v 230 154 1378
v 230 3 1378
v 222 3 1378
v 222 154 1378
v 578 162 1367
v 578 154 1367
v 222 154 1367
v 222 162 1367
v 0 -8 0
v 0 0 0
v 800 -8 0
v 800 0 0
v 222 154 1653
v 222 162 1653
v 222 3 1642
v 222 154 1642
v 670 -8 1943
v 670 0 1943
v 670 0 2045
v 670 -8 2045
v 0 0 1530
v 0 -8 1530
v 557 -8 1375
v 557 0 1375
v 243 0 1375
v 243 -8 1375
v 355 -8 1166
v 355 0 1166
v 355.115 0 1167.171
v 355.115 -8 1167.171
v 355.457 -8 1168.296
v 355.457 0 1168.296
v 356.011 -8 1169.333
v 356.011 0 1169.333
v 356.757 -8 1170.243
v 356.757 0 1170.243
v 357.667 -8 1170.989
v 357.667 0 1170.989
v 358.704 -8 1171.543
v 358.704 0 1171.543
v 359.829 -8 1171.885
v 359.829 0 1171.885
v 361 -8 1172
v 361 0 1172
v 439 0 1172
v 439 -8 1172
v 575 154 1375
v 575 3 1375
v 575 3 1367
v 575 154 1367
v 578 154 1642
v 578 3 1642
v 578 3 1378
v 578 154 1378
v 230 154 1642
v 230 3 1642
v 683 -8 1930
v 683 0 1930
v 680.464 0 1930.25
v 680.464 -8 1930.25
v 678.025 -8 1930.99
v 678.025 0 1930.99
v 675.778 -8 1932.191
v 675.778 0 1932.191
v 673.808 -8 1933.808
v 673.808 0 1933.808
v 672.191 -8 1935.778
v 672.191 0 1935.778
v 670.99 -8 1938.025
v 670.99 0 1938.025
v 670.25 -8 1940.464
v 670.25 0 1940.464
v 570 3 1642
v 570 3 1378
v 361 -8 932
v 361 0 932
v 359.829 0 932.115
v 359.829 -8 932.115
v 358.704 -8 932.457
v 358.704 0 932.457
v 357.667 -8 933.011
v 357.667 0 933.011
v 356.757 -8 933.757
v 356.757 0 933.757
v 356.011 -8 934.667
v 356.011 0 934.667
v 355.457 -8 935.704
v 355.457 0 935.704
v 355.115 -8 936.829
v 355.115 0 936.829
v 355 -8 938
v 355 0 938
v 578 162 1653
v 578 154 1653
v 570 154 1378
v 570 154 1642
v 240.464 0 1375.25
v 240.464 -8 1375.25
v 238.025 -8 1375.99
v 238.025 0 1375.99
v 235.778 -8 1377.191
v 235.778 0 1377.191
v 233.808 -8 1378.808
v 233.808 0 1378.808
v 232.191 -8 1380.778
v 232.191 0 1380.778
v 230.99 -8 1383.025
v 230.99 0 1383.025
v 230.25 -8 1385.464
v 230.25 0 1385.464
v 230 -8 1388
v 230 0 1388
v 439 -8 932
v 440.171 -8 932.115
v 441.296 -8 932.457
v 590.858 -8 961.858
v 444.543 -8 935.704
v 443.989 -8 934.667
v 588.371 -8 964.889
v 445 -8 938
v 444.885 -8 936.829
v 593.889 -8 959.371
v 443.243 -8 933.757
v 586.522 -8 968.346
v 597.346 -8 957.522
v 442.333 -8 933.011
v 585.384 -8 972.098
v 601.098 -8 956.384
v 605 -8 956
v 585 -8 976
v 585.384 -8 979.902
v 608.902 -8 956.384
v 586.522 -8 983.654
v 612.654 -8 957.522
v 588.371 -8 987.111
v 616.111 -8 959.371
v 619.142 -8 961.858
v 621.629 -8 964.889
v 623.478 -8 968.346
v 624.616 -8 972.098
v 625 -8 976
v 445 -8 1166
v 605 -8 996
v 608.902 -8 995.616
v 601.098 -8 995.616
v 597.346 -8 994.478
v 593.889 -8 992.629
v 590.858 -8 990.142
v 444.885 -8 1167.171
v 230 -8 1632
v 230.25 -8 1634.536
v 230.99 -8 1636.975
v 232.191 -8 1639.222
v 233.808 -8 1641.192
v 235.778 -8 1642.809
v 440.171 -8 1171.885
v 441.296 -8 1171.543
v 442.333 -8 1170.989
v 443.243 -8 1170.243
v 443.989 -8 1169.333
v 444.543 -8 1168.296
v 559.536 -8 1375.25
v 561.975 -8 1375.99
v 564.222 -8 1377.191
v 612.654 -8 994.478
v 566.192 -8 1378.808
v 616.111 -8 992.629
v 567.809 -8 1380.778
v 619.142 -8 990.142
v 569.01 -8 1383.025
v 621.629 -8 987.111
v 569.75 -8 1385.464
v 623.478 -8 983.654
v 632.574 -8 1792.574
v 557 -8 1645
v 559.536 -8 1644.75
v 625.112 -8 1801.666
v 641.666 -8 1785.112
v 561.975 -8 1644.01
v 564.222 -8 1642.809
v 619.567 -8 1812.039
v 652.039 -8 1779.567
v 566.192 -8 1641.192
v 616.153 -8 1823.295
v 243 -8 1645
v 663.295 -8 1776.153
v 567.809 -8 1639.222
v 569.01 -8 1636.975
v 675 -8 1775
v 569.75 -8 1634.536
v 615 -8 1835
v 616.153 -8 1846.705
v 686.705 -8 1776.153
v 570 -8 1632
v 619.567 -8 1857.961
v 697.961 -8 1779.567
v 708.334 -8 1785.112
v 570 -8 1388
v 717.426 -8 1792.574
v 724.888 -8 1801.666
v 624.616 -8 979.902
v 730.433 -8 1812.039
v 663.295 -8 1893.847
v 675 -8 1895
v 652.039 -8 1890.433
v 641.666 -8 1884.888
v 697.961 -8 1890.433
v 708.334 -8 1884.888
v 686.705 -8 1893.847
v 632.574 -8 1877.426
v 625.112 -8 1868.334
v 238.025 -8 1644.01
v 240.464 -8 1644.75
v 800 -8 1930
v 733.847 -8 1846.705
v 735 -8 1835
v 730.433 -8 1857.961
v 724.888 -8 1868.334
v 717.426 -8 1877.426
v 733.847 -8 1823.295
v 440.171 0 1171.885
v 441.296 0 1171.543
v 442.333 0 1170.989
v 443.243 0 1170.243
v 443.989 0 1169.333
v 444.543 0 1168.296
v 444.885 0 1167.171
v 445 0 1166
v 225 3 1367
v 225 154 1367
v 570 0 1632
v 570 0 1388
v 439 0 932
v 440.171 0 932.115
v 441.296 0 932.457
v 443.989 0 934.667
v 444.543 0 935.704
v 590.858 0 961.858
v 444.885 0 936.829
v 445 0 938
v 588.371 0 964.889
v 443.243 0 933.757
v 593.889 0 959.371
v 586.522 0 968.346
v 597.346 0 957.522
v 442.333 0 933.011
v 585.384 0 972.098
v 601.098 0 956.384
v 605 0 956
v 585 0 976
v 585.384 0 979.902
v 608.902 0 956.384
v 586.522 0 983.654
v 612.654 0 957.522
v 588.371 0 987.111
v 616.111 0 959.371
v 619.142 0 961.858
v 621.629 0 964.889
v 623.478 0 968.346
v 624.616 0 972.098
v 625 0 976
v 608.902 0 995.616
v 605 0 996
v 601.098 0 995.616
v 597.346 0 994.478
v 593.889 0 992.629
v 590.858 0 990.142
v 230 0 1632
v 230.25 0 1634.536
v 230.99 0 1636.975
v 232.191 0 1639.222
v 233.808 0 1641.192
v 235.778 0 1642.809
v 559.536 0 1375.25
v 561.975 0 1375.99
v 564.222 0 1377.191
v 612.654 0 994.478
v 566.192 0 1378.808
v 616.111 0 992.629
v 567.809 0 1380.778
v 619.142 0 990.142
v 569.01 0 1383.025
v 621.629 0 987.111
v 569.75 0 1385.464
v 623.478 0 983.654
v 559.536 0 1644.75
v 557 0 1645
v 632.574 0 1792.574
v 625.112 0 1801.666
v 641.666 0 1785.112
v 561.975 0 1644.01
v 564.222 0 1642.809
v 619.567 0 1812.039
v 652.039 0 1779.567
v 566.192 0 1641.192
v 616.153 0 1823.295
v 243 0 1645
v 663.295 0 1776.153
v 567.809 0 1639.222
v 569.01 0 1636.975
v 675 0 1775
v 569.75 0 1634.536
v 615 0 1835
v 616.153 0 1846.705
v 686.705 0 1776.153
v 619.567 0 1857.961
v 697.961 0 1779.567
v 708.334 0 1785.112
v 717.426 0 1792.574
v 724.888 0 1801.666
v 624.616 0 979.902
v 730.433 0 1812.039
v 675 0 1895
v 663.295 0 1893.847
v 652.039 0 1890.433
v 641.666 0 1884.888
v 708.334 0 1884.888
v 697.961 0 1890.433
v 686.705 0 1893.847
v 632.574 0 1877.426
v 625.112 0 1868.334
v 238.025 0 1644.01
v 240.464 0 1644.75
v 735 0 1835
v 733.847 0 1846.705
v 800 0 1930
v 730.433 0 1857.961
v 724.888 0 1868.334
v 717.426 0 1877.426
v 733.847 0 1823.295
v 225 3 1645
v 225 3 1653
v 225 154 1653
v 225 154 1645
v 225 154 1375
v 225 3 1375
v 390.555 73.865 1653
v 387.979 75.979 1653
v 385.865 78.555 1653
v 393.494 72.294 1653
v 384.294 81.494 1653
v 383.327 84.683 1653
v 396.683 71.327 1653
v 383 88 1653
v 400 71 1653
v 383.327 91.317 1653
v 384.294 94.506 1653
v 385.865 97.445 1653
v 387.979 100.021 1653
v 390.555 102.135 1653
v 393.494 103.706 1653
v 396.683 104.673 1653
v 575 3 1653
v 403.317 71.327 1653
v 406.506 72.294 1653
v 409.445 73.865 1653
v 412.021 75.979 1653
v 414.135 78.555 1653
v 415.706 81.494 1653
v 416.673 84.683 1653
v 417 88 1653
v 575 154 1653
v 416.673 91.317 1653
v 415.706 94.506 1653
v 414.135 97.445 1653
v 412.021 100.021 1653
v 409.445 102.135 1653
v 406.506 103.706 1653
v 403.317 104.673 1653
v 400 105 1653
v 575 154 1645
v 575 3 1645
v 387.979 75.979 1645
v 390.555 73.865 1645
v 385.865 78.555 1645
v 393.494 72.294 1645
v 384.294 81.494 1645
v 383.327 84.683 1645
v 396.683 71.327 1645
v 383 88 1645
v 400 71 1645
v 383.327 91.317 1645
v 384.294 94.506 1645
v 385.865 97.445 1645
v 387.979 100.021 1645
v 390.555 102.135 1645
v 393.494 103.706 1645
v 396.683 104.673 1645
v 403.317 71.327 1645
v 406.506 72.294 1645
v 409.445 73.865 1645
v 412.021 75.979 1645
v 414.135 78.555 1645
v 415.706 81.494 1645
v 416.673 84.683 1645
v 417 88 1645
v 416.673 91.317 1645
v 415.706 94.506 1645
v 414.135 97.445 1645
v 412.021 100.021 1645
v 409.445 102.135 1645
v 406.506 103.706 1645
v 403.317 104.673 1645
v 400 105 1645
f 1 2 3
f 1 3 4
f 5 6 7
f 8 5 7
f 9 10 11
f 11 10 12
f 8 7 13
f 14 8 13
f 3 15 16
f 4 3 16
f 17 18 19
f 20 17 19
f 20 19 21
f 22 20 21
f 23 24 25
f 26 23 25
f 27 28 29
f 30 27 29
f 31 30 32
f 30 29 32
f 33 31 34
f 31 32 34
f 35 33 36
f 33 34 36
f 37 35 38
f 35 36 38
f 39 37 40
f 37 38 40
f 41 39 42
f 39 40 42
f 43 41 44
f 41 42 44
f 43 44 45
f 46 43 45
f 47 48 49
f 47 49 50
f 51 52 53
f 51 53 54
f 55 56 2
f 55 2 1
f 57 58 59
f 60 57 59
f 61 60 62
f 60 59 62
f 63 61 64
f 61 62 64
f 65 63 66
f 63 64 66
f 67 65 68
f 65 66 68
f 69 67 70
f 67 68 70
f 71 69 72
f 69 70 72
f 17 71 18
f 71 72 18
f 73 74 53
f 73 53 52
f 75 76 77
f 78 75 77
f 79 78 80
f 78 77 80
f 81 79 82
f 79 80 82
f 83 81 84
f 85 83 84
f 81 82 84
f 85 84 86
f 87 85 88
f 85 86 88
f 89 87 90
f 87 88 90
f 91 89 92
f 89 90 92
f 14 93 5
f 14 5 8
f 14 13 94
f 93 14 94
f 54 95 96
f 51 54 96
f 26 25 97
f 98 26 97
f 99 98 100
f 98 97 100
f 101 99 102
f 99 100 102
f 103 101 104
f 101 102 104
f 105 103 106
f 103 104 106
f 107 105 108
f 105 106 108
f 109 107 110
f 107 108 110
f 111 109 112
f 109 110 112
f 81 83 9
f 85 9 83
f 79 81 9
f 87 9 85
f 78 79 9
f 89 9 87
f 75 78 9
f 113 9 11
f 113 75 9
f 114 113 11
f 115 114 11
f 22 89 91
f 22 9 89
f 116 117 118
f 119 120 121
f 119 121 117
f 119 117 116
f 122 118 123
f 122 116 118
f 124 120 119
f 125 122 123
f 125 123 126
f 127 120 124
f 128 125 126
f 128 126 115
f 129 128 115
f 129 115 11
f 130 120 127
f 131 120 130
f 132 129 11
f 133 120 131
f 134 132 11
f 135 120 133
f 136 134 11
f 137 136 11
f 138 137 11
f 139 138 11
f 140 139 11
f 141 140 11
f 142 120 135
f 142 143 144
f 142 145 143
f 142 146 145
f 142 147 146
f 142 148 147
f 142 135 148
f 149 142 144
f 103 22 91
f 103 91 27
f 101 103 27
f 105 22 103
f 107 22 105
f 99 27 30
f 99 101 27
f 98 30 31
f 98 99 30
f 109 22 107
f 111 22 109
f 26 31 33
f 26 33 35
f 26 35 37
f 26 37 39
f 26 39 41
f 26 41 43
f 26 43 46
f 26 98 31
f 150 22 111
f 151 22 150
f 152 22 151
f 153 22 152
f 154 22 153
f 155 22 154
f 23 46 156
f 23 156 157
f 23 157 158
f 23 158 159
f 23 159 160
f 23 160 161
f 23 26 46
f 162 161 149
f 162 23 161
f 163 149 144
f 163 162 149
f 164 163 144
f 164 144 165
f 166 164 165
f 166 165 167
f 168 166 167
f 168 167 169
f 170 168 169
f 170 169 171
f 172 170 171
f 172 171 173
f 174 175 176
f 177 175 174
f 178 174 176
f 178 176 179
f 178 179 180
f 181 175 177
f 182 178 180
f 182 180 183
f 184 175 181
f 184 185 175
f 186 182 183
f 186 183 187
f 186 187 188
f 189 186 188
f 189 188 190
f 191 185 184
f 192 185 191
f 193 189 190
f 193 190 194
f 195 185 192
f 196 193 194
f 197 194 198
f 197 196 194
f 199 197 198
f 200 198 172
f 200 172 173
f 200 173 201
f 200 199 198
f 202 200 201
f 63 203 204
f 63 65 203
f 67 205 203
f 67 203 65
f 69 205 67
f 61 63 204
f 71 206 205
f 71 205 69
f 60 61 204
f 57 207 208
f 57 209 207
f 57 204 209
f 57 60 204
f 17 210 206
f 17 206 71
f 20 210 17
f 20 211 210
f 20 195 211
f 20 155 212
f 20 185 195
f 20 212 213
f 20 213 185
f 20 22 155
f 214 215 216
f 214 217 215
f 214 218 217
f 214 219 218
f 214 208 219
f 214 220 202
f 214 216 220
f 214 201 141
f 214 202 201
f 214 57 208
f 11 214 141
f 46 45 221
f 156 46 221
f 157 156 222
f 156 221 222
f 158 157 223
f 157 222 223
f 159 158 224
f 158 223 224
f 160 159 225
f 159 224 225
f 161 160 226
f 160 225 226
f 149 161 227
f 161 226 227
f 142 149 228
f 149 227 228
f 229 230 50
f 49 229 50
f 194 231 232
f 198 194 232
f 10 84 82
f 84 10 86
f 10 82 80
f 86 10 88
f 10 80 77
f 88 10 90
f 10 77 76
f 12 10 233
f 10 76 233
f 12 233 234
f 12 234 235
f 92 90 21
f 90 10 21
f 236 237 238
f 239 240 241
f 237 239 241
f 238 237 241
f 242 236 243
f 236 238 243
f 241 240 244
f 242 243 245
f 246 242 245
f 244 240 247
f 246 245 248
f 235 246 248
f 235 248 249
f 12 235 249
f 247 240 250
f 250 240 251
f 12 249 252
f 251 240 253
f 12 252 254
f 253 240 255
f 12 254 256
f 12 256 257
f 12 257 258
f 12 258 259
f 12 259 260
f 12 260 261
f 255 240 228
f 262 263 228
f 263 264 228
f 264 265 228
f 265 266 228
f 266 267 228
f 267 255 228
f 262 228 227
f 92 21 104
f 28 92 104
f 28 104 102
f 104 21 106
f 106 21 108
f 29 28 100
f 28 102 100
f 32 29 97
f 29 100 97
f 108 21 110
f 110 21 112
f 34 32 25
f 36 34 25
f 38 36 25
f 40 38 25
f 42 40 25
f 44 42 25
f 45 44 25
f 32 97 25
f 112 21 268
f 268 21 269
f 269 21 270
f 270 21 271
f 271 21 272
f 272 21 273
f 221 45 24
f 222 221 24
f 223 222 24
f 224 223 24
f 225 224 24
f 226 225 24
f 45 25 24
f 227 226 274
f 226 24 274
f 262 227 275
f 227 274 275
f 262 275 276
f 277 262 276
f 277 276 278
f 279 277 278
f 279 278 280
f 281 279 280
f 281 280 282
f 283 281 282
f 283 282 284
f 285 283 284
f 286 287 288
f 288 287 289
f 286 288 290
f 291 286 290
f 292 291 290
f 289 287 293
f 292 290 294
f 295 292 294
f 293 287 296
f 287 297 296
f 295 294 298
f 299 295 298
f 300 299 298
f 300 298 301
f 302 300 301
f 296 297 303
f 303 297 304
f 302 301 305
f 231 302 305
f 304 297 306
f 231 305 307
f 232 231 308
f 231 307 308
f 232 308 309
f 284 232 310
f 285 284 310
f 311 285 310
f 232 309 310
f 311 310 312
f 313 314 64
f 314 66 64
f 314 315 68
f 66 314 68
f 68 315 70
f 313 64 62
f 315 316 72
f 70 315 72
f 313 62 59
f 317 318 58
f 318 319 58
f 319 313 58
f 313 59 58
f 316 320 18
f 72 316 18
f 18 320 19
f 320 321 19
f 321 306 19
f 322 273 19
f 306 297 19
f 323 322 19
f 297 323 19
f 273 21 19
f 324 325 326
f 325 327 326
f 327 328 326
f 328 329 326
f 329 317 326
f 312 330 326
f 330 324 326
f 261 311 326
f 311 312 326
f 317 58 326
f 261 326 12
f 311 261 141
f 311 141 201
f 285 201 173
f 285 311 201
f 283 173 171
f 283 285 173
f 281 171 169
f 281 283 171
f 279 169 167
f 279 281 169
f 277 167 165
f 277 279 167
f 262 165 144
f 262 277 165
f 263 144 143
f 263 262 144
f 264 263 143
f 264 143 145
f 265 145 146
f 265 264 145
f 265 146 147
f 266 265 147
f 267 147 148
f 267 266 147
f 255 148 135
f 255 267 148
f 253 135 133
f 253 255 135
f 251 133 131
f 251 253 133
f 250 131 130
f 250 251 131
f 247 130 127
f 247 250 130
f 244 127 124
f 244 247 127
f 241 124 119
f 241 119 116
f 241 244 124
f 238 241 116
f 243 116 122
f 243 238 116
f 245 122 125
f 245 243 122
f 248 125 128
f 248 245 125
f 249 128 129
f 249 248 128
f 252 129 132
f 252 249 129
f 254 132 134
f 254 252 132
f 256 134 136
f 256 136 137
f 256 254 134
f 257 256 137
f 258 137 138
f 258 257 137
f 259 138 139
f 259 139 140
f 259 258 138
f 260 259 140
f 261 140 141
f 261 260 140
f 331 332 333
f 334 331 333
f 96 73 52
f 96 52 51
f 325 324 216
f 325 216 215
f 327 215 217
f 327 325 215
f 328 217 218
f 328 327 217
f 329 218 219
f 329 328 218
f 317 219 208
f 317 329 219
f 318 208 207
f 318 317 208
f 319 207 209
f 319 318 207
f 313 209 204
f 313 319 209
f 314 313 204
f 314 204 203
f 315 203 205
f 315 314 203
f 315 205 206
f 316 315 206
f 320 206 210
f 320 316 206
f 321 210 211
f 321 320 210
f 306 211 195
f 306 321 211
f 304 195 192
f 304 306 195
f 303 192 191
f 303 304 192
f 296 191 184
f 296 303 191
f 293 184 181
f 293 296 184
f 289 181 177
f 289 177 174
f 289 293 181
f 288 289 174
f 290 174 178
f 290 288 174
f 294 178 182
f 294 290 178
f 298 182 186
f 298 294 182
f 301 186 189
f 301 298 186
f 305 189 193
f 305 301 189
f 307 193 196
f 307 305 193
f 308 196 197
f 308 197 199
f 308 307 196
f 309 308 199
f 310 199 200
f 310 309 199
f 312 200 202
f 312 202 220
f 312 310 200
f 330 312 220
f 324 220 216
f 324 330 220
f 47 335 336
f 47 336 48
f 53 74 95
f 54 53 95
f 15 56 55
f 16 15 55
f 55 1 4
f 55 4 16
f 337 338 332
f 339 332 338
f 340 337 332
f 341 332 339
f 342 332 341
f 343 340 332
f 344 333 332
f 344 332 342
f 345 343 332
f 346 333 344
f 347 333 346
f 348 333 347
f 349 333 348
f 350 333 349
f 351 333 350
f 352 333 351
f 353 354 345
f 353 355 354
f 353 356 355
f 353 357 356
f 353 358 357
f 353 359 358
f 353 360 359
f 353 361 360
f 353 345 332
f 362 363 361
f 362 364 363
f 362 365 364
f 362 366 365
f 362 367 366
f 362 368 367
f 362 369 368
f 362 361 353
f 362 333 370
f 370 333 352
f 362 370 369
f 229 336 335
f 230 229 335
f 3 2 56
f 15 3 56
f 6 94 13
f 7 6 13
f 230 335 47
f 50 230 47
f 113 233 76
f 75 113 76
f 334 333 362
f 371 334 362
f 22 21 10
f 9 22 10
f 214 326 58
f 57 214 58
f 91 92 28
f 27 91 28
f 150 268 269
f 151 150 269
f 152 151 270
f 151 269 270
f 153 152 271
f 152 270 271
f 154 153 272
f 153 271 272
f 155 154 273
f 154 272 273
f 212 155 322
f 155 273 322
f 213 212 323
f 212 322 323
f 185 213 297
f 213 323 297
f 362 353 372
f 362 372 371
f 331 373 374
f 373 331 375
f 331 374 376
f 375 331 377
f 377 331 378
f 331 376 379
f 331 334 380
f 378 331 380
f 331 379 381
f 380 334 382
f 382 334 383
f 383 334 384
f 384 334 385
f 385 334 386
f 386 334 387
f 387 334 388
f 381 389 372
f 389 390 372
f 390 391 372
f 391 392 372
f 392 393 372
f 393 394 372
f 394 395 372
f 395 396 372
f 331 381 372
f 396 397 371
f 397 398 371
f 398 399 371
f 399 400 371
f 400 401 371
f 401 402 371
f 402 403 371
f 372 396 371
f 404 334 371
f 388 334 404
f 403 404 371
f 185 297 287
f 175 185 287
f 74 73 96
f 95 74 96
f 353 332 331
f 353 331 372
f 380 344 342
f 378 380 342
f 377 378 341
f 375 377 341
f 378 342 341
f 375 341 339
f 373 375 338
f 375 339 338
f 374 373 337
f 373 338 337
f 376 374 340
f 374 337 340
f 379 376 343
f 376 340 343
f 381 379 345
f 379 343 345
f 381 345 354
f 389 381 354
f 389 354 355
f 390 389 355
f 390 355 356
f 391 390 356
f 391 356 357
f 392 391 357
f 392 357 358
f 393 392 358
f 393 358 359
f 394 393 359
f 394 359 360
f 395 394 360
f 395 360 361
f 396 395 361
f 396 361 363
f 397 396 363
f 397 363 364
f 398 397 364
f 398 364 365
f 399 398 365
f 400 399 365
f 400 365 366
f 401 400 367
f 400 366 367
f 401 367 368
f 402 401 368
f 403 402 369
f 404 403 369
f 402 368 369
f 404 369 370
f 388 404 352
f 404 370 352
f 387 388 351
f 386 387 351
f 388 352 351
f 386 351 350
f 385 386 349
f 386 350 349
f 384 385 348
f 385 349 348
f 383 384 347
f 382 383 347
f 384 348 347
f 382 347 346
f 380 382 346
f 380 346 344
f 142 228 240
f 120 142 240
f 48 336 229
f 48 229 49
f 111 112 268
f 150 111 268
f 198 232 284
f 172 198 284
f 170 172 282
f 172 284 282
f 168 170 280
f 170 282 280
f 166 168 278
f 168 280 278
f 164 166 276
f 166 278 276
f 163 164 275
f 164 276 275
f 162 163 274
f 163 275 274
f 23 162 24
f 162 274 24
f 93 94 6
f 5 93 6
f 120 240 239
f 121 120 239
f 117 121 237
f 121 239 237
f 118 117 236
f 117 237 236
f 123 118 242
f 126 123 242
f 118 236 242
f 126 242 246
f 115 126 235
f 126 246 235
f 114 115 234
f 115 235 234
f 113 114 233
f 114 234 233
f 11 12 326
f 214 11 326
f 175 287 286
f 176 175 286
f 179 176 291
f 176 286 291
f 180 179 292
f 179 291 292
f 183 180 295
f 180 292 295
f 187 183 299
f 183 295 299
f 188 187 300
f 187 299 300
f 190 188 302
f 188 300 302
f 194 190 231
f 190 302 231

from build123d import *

# Parameters (mm, degrees)
F0_R      = 20
F0_R_2    = 60
F1_DEPTH  = 8
F2_W      = 350
F2_H      = 151
F3_DEPTH  = 8
F6_D      = 34
F7_W      = 151
F7_H      = 264
F8_DEPTH  = 8
F11_W     = 350
F11_H     = 8
F12_DEPTH = 8


with BuildPart() as f1:
    # F0 (on Front) → F1 (new body)
    with BuildSketch(Plane.XZ):
        with BuildLine():
            Line((0, 1530), (0, 0))
            Line((0, 0), (800, 0))
            Line((800, 0), (800, 1930))
            Line((800, 1930), (683, 1930))
            ThreePointArc((683, 1930), (673.807612, 1933.807612), (670, 1943))
            Line((670, 1943), (670, 2045))
            Line((670, 2045), (0, 1530))
        make_face()
        with Locations((605, 976)):
            Circle(F0_R, mode=Mode.SUBTRACT)
        with BuildLine():
            ThreePointArc((230, 1632), (233.807612, 1641.192388), (243, 1645))
            Line((243, 1645), (557, 1645))
            ThreePointArc((557, 1645), (566.192388, 1641.192388), (570, 1632))
            Line((570, 1632), (570, 1388))
            ThreePointArc((570, 1388), (566.192388, 1378.807612), (557, 1375))
            Line((557, 1375), (243, 1375))
            ThreePointArc((243, 1375), (233.807612, 1378.807612), (230, 1388))
            Line((230, 1388), (230, 1632))
        make_face(mode=Mode.SUBTRACT)
        with BuildLine():
            ThreePointArc((355, 1166), (356.757359, 1170.242641), (361, 1172))
            Line((361, 1172), (439, 1172))
            ThreePointArc((439, 1172), (443.242641, 1170.242641), (445, 1166))
            Line((445, 1166), (445, 938))
            ThreePointArc((445, 938), (443.242641, 933.757359), (439, 932))
            Line((439, 932), (361, 932))
            ThreePointArc((361, 932), (356.757359, 933.757359), (355, 938))
            Line((355, 938), (355, 1166))
        make_face(mode=Mode.SUBTRACT)
        with Locations((675, 1835)):
            Circle(F0_R_2, mode=Mode.SUBTRACT)
    extrude(amount=F1_DEPTH)


with BuildPart() as f3:
    # F2 (on face) → F3 (new body)
    with BuildSketch(Plane.XY.offset(1375)):
        with Locations((400, 78.5)):
            Rectangle(F2_W, F2_H)
    extrude(amount=-F3_DEPTH)


with BuildPart() as f4_1:
    # F4: copy of F3
    add(f3.part.moved(Location((0, 0, 278))))

    # F6 (through all)
    with Locations(Plane(origin=(0, 0, 1645), x_dir=(1, 0, 0), z_dir=(0, 0, -1))):
        with Locations((400, -88)):
            Hole(F6_D / 2)


with BuildPart() as f8:
    # F7 (on face) → F8 (new body)
    with BuildSketch(Plane.YZ.offset(230)):
        with Locations((78.5, 1510)):
            Rectangle(F7_W, F7_H)
    extrude(amount=-F8_DEPTH)


with BuildPart() as f10_1:
    # F10: instance of F8
    add(f8.part.mirror(Plane(origin=(400, -4, 1510), x_dir=(0, 1, 0), z_dir=(1, 0, 0))))


with BuildPart() as f12:
    # F11 (on face) → F12 (new body)
    with BuildSketch(Plane(origin=(0, 154, 0), x_dir=(-1, 0, 0), z_dir=(0, 1, 0))):
        Polygon((-222, 1653), (-578, 1653), (-578, 1367), (-575, 1367), (-575, 1375), (-225, 1375), (-225, 1367), (-222, 1367), align=None)
        with Locations((-400, 1371)):
            Rectangle(F11_W, F11_H)
    extrude(amount=F12_DEPTH)


solid = Compound([f1.part, f3.part, f4_1.part, f8.part, f10_1.part, f12.part])
